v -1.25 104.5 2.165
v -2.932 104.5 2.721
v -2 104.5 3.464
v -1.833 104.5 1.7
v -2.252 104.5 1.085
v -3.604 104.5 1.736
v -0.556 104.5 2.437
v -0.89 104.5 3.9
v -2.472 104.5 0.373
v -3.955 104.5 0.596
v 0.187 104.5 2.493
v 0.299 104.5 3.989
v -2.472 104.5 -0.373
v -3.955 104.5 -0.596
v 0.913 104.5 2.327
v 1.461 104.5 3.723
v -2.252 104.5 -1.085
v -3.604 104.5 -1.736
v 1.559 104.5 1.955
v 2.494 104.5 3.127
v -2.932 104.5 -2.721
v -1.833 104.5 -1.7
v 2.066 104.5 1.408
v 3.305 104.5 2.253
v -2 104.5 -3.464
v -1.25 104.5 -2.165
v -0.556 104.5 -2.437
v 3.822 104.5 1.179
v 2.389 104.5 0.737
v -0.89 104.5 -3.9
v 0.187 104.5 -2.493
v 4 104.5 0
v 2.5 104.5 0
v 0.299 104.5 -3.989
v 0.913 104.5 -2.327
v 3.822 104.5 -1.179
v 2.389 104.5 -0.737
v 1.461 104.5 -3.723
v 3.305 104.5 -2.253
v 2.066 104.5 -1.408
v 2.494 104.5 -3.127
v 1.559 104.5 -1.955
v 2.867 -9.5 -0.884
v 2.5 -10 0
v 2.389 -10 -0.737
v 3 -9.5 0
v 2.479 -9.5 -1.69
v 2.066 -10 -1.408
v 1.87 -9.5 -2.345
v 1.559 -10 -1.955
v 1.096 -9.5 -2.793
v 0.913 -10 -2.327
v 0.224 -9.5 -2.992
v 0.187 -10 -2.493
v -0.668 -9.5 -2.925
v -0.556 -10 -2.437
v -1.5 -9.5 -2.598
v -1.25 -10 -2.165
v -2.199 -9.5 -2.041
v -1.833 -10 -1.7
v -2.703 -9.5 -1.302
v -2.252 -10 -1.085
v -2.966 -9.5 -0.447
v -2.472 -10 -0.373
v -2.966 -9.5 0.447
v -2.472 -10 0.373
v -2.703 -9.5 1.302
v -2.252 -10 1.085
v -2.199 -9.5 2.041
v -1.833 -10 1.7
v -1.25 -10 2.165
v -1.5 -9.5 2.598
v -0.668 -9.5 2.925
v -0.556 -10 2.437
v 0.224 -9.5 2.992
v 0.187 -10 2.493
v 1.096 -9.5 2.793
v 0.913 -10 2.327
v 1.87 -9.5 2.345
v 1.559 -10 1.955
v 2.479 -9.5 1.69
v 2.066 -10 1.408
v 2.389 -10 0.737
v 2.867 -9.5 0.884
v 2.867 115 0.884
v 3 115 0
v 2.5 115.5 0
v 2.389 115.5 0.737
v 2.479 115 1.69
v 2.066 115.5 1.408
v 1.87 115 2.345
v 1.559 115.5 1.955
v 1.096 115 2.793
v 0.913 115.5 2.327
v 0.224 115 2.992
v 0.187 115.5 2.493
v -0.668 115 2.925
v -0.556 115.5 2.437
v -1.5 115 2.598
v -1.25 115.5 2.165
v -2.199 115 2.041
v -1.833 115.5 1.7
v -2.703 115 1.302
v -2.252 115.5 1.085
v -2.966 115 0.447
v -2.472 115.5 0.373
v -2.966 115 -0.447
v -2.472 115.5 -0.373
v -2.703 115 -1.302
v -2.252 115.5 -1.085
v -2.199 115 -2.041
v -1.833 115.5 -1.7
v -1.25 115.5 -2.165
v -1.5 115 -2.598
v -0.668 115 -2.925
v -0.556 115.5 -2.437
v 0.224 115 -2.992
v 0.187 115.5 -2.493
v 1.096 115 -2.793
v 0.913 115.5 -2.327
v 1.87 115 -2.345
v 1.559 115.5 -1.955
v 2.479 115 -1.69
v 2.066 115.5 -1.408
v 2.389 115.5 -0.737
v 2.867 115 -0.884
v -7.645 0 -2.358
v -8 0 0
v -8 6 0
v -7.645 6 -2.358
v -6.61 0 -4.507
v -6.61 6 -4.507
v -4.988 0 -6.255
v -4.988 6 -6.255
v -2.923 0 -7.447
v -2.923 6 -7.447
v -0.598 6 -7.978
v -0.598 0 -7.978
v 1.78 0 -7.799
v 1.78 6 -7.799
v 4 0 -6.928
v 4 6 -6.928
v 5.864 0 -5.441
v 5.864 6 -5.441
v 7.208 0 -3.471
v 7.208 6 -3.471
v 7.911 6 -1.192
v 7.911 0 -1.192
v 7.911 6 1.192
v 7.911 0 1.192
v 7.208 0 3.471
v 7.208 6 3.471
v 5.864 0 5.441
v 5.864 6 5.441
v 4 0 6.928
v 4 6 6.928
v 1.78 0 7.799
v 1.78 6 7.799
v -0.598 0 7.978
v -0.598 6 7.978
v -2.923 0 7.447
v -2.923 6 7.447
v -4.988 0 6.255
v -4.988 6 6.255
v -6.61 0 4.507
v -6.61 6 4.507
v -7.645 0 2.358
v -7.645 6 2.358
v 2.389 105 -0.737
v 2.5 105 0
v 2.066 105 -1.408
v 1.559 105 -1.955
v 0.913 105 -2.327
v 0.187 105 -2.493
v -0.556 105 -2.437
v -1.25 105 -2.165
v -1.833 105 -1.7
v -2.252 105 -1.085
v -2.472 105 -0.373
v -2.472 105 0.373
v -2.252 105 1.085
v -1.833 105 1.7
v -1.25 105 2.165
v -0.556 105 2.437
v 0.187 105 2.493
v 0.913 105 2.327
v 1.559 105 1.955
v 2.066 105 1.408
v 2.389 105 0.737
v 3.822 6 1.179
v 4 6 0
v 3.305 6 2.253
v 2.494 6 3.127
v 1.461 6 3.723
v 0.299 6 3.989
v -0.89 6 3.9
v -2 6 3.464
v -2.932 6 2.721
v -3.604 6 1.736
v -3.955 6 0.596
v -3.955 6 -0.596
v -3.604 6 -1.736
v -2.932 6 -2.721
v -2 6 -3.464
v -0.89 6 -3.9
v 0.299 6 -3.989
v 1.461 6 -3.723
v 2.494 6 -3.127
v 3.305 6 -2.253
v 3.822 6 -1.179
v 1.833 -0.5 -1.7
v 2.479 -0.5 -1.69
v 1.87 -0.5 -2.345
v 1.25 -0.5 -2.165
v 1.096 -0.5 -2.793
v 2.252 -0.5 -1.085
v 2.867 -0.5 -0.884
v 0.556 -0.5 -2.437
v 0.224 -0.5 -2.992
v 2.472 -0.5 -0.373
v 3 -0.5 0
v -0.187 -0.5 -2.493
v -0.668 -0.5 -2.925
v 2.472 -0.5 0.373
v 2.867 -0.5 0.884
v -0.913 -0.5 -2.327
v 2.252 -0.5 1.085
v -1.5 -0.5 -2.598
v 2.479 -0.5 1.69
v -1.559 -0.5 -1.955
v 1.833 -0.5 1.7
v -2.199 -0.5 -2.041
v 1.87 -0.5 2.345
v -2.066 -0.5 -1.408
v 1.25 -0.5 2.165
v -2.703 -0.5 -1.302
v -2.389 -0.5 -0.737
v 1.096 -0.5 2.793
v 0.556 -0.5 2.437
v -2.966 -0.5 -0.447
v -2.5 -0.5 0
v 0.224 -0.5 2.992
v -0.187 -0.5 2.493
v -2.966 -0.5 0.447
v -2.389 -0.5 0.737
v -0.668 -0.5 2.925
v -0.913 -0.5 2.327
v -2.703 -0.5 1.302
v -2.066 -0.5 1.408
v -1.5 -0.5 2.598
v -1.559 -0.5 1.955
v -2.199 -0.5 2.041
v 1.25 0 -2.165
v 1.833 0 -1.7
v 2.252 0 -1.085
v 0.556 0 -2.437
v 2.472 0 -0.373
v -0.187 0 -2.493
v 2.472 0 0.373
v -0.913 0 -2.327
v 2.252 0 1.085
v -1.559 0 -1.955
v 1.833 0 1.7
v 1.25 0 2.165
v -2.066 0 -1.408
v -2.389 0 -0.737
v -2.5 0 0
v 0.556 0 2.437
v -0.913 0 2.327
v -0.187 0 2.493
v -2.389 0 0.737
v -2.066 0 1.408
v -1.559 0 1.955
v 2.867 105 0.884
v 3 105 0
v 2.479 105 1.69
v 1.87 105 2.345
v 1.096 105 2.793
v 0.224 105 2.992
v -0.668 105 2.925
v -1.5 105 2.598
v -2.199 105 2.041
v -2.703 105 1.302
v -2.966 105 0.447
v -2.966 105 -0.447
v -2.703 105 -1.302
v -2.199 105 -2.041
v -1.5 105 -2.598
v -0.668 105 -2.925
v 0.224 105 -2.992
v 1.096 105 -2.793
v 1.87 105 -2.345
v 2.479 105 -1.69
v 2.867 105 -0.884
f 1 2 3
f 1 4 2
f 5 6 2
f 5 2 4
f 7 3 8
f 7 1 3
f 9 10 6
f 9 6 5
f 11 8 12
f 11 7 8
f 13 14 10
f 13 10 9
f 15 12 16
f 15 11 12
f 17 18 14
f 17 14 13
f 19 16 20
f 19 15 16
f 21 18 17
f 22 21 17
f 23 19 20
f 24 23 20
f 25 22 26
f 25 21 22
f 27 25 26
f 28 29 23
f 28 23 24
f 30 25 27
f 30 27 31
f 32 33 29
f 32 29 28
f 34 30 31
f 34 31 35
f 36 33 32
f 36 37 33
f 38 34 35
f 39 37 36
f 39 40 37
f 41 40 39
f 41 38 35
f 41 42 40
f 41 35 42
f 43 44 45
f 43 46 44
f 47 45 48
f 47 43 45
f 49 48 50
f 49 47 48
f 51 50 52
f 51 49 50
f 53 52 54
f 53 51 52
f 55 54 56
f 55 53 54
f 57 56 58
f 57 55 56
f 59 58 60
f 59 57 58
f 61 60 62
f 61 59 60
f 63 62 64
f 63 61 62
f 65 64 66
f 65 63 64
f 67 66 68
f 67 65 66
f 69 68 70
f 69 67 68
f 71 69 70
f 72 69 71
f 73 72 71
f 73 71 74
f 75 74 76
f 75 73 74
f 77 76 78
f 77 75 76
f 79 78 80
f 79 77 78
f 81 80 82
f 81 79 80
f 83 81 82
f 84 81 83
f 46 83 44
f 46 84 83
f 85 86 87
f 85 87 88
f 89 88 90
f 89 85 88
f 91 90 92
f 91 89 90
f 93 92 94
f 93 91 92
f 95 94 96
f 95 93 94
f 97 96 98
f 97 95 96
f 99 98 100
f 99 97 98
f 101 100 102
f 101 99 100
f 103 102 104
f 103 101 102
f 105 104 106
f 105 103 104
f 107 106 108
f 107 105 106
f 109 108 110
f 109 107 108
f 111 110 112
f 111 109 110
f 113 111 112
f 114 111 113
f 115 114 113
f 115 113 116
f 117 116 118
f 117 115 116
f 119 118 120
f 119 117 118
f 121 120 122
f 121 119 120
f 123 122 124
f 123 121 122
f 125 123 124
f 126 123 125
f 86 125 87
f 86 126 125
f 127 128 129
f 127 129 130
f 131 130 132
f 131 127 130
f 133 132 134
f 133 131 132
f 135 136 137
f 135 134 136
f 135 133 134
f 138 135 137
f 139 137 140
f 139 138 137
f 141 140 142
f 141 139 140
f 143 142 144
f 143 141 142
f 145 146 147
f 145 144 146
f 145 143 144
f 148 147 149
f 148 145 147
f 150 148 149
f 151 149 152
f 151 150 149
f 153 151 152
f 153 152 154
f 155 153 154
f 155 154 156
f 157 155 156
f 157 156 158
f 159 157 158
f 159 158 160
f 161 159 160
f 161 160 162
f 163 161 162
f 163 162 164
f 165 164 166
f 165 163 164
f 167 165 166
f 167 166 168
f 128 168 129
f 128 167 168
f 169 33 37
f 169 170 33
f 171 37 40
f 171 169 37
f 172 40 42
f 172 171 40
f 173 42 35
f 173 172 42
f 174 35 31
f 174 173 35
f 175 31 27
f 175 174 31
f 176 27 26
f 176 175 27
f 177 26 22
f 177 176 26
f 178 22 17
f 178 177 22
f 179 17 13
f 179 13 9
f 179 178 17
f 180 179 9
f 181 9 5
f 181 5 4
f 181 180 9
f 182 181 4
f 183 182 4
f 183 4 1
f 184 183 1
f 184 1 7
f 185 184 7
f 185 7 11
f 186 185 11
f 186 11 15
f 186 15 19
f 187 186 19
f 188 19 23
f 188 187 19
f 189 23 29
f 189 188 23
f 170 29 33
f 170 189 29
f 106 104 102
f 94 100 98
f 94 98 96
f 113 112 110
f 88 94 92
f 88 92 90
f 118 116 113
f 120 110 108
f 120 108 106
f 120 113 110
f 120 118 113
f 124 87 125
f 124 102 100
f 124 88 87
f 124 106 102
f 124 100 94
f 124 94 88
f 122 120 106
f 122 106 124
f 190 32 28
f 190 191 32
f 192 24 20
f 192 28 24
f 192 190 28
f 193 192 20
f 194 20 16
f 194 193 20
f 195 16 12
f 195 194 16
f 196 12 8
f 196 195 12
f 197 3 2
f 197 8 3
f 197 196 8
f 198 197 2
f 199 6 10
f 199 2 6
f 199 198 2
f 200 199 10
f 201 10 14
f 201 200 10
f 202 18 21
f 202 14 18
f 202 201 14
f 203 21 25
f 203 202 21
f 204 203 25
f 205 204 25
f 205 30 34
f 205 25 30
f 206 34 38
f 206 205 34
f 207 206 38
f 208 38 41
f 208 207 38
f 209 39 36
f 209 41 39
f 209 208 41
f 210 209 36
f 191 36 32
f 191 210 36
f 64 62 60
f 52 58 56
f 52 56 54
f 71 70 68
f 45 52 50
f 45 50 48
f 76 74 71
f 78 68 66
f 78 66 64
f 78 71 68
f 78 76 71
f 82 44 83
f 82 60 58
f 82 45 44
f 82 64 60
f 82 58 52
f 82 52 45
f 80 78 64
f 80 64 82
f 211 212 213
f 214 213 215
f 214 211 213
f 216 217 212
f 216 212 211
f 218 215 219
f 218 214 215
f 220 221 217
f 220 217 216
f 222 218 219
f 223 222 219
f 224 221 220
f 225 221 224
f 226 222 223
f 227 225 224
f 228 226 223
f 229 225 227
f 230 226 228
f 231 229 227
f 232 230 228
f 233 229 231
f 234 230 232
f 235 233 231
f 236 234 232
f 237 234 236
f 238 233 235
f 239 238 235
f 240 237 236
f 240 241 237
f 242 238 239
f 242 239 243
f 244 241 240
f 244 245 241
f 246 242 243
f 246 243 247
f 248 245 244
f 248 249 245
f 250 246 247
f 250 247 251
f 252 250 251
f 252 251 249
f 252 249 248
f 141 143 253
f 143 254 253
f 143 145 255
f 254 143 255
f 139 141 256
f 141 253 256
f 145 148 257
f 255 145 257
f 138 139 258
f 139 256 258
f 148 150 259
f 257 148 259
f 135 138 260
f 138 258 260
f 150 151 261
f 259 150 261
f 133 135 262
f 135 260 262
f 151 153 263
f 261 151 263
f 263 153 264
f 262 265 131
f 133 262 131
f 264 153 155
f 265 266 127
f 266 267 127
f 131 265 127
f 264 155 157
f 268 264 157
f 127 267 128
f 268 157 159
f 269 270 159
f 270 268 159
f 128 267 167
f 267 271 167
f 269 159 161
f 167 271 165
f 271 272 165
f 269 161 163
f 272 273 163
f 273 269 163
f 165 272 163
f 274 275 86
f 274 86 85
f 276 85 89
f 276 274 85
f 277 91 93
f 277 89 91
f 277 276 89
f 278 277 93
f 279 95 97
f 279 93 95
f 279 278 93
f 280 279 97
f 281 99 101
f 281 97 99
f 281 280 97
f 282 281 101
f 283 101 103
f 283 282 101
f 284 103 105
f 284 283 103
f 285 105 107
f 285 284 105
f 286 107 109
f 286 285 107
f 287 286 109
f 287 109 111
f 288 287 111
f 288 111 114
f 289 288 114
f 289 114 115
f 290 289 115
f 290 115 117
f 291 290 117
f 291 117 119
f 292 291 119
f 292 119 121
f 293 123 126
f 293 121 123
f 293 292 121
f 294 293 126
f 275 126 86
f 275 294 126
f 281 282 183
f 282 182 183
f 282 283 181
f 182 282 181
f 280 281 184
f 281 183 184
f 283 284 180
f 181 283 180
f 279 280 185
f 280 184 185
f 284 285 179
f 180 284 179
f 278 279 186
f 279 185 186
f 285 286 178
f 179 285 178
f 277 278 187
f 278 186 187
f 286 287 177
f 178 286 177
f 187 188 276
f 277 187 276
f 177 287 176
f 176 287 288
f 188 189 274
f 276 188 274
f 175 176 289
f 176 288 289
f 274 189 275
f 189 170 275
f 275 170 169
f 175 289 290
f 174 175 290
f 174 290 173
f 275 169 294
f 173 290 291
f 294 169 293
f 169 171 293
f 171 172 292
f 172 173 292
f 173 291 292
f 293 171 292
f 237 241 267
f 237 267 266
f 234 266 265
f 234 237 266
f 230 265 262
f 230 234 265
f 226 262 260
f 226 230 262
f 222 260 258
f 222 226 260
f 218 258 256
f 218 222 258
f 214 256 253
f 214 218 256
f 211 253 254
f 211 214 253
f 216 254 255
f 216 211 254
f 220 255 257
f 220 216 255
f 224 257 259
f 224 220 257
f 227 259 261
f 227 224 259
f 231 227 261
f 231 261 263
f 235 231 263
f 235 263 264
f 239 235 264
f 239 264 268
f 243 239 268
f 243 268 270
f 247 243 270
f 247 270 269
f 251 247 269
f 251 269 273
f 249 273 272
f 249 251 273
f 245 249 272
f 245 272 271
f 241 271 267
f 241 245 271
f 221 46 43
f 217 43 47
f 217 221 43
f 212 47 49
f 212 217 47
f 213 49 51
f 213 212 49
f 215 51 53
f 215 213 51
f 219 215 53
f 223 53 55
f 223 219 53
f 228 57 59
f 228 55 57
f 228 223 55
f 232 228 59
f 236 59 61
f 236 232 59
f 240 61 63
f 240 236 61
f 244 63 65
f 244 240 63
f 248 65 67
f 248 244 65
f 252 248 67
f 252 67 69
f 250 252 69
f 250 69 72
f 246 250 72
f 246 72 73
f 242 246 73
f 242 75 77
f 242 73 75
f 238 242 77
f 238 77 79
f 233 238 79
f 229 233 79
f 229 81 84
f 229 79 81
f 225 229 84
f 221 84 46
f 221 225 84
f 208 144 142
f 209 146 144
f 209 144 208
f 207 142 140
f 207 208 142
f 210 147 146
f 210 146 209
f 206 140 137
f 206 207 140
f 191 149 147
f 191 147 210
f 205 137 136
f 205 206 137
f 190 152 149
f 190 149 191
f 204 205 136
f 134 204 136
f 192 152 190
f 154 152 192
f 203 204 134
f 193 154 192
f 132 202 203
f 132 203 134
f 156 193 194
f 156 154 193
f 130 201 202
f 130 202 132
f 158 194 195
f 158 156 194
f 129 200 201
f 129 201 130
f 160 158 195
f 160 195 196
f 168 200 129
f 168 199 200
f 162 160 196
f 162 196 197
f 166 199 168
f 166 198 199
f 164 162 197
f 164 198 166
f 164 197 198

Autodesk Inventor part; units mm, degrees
ref_plane "YZ Plane" through (0, 0, 0) normal (1, 0, 0) x (0, 1, 0)
ref_plane "XZ Plane" through (0, 0, 0) normal (0, 1, 0) x (-1, 0, 0)
ref_plane "XY Plane" through (0, 0, 0) normal (0, 0, 1) x (1, 0, 0)
sketch "Sketch1" plane through (0, 0, 0) normal (0, 1, 0) x (-1, 0, 0)
  circle A0 centre (0, 0) radius 8
  dimension "d0" = 16
extrude "srodek" add sketch "Sketch1" along normal blind 6
sketch "Sketch2" plane through (0, 0, 0) normal (0, -1, 0) x (1, 0, 0)
  circle A0 centre (0, 0) radius 8 projected
  circle A1 centre (0, 0) radius 3
  dimension "d3" = 6
extrude "dolne" add sketch "Sketch2" along normal blind 10 contours A1
thread "Thread1" size "M6x1" class "6g" standard "ANSI Metric M Profile" full length
chamfer "Chamfer1" distance 0.5 angle 45 1 edges at (-3, -10, 0)
sketch "Sketch3" plane through (0, 0, 0) normal (0, 0, 1) x (1, 0, 0)
  line L0 (3, 0) -> (-3, 0) projected
  line L1 (-3, 0) -> (-2.5, 0)
  line L2 (-2.5, 0) -> (-2.5, -0.5)
  line L3 (-2.5, -0.5) -> (-3, -0.5)
  line L4 (-3, -0.5) -> (-3, 0)
  line L5 (0, -0.6) -> (0, 0.1) projected
  point P0 (0, 0)
  point P1 (-2.5, 0)
  dimension "d11" = 0.5
  dimension "d12" = 0.5
revolve "Revolution1" cut sketch "Sketch3" angle 360 about axis through (0, -10, 0) along (0, 1, 0)
sketch "Sketch8" plane through (0, 6, 0) normal (0, 1, 0) x (1, 0, 0)
  circle A0 centre (0, 0) radius 4
  dimension "d35" = 8
extrude "gora" add sketch "Sketch8" along normal blind 98.5
sketch "Sketch6" plane through (0, 104.5, 0) normal (0, 1, 0) x (1, 0, 0)
  circle A0 centre (0, 0) radius 4 projected
  circle A1 centre (0, 0) radius 3
  dimension "d19" = 6
extrude "mocowanie K1" add sketch "Sketch6" along normal blind 11 contours A1
thread "Thread3" size "M6x1" class "6g" standard "ISO Metric profile" full length
chamfer "Chamfer3" distance 0.5 angle 45 1 edges at (-3, 115.5, 0)
sketch "Sketch9" plane through (0, 0, 0) normal (0, 0, 1) x (1, 0, 0)
  line L0 (-3, 104.5) -> (3, 104.5) construction
  line L1 (3, 115) -> (-3, 115) construction
  line L2 (3, 104.5) -> (2.5, 104.5)
  line L3 (2.5, 104.5) -> (2.5, 105)
  line L4 (2.5, 105) -> (3, 105)
  line L5 (3, 105) -> (3, 104.5)
  line L6 (0, -35.2) -> (0, 141.2) projected
  point P0 (0, 0)
  dimension "d38" = 0.5
  dimension "d39" = 0.5
revolve "Revolution3" cut sketch "Sketch9" angle 360 about axis through (0, -10, 0) along (0, 1, 0)
properties part number "KN-00-02-10" material "X5CrNi18-10"
